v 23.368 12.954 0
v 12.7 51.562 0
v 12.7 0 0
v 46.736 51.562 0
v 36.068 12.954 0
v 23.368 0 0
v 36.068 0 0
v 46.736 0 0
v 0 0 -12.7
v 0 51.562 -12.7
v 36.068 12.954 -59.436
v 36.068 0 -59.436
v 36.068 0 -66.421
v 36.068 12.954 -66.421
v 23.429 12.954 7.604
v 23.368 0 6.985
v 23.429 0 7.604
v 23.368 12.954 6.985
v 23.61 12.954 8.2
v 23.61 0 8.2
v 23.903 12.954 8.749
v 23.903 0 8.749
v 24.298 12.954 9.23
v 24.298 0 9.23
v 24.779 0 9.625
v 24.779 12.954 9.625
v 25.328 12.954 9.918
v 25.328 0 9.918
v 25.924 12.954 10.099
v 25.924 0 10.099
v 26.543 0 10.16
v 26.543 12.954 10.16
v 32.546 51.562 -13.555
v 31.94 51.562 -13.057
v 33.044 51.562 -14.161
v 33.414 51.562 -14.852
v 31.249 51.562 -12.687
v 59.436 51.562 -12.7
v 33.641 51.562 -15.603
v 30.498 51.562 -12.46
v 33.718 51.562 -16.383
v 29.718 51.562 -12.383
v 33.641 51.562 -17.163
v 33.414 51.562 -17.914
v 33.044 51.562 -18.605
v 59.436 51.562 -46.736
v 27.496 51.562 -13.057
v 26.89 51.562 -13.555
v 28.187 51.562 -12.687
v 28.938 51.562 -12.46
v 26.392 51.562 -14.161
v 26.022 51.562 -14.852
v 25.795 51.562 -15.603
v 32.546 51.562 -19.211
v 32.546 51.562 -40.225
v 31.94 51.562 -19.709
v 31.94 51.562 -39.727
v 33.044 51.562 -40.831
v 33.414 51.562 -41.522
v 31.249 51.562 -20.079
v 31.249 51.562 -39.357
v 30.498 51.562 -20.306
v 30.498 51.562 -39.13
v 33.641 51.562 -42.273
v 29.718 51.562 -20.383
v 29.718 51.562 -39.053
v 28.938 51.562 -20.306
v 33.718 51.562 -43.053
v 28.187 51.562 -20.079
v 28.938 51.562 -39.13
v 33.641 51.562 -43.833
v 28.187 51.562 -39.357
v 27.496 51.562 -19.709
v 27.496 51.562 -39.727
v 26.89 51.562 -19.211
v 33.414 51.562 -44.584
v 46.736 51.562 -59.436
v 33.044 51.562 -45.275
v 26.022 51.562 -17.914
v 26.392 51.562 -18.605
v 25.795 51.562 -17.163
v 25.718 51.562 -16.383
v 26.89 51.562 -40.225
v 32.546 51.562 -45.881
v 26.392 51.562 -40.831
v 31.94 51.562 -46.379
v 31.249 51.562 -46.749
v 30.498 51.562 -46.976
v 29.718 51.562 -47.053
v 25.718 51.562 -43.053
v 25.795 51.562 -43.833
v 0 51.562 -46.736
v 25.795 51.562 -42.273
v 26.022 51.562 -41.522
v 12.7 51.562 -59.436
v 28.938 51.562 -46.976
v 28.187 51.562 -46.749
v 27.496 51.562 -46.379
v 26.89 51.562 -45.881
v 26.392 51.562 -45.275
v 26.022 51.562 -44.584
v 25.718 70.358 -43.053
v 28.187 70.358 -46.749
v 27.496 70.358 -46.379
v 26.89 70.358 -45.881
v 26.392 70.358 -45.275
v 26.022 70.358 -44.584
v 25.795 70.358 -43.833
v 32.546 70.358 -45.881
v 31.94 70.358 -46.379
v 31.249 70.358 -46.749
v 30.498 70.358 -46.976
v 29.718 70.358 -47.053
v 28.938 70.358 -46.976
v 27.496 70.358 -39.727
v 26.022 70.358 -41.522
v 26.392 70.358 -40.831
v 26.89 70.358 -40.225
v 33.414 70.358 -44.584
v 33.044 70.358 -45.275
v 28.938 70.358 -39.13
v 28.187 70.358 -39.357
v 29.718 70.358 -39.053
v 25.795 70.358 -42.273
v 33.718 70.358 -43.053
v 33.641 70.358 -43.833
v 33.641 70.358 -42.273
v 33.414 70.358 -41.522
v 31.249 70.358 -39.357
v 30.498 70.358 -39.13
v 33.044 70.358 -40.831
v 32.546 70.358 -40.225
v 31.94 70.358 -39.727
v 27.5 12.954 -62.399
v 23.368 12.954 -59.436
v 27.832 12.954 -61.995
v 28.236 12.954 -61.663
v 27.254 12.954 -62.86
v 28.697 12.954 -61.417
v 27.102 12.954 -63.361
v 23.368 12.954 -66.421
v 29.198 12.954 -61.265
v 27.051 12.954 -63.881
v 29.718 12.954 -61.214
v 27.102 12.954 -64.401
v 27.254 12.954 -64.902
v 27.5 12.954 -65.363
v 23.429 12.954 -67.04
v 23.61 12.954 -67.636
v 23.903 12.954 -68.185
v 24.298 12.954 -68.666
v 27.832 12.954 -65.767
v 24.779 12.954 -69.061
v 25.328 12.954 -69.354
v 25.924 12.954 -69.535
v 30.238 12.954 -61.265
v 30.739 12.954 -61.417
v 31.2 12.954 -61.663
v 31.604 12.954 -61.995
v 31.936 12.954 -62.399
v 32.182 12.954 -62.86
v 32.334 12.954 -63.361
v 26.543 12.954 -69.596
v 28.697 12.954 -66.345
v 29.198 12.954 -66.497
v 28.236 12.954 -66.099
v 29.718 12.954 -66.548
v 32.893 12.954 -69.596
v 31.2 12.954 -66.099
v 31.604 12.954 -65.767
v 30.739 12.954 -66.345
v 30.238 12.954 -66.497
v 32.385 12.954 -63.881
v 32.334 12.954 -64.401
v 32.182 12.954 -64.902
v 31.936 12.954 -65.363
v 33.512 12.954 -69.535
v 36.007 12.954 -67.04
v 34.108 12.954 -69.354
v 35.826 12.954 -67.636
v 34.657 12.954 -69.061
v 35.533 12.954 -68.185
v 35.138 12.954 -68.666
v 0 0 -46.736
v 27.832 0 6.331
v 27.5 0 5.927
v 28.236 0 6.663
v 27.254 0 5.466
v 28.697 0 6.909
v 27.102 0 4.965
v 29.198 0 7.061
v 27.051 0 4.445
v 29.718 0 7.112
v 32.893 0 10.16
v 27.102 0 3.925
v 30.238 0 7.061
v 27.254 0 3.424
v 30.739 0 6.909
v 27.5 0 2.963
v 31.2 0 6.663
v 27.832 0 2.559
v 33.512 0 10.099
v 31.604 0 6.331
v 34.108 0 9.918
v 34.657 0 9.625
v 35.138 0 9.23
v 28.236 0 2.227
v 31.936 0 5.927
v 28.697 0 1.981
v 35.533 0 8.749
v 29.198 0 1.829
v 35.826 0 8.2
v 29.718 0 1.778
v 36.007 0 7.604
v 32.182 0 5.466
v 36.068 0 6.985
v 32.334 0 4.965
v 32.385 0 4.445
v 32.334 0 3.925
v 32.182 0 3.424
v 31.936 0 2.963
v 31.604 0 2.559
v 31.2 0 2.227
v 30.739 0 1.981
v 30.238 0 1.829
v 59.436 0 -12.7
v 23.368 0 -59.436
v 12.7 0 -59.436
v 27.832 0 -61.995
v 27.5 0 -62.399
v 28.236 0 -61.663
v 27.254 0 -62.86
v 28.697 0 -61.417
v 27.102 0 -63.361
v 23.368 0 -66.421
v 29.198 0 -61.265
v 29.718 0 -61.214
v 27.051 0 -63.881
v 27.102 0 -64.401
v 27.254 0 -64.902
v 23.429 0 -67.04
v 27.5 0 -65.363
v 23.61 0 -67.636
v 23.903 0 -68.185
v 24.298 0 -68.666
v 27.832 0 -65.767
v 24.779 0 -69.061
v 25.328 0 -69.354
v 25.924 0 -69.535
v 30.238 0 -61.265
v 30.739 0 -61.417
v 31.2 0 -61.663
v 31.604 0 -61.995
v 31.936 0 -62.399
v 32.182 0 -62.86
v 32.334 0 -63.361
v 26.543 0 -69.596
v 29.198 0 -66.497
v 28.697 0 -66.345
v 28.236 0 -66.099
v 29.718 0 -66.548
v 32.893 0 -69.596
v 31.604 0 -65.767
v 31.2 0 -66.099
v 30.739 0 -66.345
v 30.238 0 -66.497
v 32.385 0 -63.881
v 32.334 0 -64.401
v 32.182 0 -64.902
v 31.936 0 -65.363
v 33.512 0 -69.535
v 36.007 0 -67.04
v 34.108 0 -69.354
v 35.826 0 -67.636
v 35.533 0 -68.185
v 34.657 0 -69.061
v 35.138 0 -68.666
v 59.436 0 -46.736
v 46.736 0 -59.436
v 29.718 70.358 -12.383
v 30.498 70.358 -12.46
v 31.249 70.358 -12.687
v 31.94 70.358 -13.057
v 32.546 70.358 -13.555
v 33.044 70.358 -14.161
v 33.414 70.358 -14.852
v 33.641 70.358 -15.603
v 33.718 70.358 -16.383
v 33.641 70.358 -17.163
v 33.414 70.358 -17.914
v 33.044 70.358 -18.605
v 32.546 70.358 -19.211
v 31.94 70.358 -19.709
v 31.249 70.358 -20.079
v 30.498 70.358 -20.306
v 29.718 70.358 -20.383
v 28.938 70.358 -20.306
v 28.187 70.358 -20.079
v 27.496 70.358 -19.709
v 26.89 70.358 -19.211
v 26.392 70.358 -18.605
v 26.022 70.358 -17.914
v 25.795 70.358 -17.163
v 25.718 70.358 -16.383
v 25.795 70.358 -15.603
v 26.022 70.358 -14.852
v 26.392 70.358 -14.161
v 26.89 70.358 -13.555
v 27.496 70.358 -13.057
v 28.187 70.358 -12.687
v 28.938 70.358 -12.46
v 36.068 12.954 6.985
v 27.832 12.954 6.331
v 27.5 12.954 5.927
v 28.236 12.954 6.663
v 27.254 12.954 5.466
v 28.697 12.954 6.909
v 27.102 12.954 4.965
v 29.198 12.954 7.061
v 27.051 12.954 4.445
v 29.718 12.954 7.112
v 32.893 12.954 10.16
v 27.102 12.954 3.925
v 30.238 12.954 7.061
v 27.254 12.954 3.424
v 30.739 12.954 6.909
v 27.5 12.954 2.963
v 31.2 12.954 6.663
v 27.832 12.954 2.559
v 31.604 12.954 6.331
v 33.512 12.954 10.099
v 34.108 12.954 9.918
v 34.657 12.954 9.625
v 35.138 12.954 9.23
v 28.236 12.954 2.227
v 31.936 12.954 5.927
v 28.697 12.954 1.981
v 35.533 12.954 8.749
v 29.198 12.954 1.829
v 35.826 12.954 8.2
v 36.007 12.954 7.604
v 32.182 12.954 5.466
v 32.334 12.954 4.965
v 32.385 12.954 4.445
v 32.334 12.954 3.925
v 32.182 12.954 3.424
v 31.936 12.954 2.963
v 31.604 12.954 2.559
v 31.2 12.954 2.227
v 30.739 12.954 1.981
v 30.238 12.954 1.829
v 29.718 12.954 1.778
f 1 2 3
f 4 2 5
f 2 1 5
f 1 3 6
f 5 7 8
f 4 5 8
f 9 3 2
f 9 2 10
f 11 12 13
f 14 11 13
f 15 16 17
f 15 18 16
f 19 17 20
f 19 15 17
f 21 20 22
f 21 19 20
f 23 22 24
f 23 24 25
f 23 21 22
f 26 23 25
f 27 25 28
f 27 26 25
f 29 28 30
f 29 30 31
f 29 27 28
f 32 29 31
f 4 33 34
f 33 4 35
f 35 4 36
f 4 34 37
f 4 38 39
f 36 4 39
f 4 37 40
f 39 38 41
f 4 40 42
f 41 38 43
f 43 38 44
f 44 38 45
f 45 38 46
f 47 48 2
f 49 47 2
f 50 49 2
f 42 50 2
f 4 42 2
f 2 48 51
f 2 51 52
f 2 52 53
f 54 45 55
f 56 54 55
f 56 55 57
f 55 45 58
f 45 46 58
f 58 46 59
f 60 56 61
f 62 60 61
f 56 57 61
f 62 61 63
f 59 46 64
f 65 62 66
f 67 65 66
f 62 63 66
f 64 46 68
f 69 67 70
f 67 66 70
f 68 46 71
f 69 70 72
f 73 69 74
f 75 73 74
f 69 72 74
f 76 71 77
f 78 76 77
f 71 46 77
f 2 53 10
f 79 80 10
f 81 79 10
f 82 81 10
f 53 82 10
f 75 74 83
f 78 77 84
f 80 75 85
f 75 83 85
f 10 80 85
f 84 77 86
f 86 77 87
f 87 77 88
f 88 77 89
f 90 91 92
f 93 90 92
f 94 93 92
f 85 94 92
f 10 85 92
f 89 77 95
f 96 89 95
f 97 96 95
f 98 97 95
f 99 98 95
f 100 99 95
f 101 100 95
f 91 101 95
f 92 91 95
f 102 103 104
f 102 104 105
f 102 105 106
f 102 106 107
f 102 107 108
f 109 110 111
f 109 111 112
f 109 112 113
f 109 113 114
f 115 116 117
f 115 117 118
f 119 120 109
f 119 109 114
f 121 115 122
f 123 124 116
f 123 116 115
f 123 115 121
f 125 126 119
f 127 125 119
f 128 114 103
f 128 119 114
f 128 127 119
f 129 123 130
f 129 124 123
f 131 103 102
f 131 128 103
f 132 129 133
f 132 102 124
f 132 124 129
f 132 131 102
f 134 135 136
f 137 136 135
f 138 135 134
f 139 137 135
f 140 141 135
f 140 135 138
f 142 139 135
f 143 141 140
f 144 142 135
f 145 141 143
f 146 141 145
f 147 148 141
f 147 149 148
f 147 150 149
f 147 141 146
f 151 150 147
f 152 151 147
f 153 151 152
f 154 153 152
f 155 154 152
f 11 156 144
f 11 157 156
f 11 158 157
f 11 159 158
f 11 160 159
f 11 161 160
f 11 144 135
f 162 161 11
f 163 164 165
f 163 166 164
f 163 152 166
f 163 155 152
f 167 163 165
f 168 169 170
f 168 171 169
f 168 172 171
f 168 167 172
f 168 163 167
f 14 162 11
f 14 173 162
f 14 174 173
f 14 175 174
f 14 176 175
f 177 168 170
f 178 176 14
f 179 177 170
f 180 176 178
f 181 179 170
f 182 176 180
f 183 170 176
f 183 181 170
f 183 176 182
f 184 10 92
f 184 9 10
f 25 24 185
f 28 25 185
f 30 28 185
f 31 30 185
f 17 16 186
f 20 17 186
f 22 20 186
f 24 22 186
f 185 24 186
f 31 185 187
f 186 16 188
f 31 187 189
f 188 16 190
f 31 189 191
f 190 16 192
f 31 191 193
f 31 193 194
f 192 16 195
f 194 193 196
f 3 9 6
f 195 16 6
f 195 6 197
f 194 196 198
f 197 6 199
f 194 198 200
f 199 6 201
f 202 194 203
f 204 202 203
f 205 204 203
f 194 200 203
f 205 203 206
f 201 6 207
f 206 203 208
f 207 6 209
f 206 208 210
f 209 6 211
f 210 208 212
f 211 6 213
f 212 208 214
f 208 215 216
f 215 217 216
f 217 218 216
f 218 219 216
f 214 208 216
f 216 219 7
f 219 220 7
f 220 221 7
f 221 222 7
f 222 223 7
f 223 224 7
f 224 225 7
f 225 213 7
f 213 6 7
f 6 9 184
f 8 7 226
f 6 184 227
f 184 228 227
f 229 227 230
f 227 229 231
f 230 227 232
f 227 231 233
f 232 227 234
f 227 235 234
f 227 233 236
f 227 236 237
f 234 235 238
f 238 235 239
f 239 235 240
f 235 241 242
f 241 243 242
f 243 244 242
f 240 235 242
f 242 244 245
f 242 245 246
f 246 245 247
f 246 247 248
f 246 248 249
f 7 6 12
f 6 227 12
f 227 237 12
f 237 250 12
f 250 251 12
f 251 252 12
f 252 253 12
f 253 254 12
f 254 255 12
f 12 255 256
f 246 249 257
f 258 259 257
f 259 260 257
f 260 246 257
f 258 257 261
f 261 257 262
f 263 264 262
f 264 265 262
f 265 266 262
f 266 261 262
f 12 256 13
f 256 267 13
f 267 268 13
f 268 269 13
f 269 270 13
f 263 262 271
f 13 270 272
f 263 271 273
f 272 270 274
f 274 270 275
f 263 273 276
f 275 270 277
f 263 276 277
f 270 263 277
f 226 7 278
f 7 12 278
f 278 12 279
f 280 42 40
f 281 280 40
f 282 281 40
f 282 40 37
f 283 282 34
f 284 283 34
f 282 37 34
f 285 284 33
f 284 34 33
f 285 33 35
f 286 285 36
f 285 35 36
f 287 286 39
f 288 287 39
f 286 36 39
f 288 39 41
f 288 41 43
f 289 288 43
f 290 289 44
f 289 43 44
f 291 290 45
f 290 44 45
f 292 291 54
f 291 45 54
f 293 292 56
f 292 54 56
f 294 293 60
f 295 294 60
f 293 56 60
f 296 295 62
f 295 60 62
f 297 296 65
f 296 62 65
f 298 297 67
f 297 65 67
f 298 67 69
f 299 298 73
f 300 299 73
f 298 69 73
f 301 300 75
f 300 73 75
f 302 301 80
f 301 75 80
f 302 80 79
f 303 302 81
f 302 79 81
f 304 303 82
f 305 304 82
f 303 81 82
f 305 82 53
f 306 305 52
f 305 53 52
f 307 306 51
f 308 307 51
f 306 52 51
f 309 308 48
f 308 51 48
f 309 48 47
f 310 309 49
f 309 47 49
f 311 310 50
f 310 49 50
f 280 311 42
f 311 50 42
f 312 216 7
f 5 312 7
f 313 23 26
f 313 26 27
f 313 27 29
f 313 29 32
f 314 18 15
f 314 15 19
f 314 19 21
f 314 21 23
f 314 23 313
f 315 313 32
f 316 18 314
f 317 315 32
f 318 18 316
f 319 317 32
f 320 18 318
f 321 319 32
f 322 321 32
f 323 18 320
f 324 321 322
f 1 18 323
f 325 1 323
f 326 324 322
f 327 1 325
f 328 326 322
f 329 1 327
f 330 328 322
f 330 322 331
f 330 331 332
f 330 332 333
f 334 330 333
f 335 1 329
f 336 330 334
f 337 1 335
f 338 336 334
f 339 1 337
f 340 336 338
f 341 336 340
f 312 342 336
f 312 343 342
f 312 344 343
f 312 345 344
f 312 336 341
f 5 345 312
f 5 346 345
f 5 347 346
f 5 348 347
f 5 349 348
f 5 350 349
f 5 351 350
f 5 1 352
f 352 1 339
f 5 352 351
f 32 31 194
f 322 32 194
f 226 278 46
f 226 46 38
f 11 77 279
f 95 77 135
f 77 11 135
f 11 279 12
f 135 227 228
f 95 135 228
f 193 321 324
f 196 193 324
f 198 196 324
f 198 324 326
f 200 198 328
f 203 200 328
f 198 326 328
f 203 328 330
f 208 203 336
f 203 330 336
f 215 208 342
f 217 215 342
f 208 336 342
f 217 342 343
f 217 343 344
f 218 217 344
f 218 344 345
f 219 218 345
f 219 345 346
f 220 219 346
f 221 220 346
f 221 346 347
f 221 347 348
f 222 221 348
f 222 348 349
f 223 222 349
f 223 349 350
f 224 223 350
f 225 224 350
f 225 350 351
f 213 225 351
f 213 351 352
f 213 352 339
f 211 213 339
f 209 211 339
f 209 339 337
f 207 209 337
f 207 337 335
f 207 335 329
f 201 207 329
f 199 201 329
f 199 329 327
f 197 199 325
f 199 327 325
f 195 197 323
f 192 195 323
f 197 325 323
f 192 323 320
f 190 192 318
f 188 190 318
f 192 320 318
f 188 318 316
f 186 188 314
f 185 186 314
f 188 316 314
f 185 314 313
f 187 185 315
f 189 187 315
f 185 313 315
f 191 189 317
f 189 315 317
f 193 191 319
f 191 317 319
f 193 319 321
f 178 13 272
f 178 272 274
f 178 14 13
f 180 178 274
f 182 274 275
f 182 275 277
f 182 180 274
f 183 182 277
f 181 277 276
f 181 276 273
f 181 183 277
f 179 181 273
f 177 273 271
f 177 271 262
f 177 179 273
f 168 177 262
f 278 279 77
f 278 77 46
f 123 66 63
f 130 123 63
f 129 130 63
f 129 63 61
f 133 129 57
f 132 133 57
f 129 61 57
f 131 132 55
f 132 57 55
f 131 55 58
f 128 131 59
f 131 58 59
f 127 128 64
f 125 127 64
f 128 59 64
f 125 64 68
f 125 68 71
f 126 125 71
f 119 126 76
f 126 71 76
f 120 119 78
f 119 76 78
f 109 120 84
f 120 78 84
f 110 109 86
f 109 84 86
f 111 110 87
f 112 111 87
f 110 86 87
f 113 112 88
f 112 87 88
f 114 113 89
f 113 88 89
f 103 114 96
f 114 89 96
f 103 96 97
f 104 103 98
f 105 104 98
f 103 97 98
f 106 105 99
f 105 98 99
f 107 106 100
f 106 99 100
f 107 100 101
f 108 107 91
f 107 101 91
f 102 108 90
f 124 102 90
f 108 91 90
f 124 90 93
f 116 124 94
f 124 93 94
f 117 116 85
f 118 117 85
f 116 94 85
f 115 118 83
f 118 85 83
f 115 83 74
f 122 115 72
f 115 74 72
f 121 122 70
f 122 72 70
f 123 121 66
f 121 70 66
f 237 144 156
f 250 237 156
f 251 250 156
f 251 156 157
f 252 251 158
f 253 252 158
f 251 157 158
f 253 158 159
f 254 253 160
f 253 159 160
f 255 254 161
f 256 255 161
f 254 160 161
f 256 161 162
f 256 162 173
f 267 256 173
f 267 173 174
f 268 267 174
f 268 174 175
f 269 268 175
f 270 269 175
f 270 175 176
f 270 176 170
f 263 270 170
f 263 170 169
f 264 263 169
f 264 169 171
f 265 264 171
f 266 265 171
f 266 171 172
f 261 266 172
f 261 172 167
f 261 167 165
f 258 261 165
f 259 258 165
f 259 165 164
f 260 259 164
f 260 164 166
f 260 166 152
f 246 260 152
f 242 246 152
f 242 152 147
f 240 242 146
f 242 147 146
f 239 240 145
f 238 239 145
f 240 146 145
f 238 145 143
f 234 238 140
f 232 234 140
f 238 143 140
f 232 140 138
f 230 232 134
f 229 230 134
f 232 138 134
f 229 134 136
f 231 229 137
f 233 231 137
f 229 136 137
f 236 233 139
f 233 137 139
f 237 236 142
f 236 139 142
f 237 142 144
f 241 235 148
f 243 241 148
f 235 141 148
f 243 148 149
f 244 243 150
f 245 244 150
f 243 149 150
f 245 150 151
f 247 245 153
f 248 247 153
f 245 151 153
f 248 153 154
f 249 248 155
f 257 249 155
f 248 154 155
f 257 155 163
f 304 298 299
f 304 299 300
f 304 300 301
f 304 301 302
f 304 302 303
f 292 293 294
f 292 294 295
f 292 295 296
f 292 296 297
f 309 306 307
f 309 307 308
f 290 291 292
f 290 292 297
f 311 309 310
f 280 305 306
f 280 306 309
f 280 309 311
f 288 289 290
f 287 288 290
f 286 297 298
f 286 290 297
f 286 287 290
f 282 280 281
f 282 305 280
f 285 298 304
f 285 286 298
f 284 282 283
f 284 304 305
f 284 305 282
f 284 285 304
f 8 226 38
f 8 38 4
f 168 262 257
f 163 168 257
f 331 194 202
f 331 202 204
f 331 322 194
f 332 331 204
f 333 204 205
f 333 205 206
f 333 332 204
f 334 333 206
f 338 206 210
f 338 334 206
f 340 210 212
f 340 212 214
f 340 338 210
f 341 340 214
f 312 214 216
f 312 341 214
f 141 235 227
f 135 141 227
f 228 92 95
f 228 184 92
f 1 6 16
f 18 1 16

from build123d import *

# Parameters (mm, degrees)
BOSS_EXTRUDE1_DEPTH = 12.954
BOSS_EXTRUDE2_DEPTH = 38.608
SKETCH3_R           = 2.667
CUT_EXTRUDE1_DEPTH  = 100.331862844
FILLET1_R           = 3.175
SKETCH4_R           = 4
BOSS_EXTRUDE3_DEPTH = 18.796


with BuildPart() as part:
    # Sketch1 → Boss-Extrude1 (new body)
    with BuildSketch(Plane(origin=(0, 0, 0), x_dir=(1, 0, 0), z_dir=(0, 1, 0))):
        Polygon((36.068, 0), (29.718, 0), (23.368, 0), (23.368, -10.16), (36.068, -10.16), align=None)
        Polygon((36.068, 59.436), (29.718, 59.436), (29.718, 0), (36.068, 0), (46.736, 0), (59.436, 12.7), (59.436, 46.736), (46.736, 59.436), align=None)
        Polygon((29.718, 0), (29.718, 59.436), (23.368, 59.436), (12.7, 59.436), (0, 46.736), (0, 12.7), (12.7, 0), (23.368, 0), align=None)
        Polygon((23.368, 59.436), (29.718, 59.436), (36.068, 59.436), (36.068, 69.596), (23.368, 69.596), align=None)
    extrude(amount=BOSS_EXTRUDE1_DEPTH)

    # Sketch2 → Boss-Extrude2 (add)
    with BuildSketch(Plane(origin=(0, 12.954, 0), x_dir=(1, 0, 0), z_dir=(0, 1, 0))):
        Polygon((23.368, 59.436), (36.068, 59.436), (46.736, 59.436), (59.436, 46.736), (59.436, 12.7), (46.736, 0), (36.068, 0), (23.368, 0), (12.7, 0), (0, 12.7), (0, 46.736), (12.7, 59.436), align=None)
    extrude(amount=BOSS_EXTRUDE2_DEPTH)

    # Sketch3 → Cut-Extrude1 (cut, through all)
    with BuildSketch(Plane(origin=(0, 12.954, 0), x_dir=(1, 0, 0), z_dir=(0, 1, 0))):
        with Locations(Location((29.718, 63.881, 0), (0, 0, 270))):
            Circle(SKETCH3_R)
        with Locations(Location((29.718, -4.445, 0), (0, 0, 270))):
            Circle(SKETCH3_R)
    extrude(amount=-CUT_EXTRUDE1_DEPTH, mode=Mode.SUBTRACT)

    # Fillet1
    fillet1_edges = [part.edges().sort_by_distance(p)[0] for p in [
        (36.068, 6.477, 10.16),
        (23.368, 6.477, 10.16),
        (23.368, 6.477, -69.596),
        (36.068, 6.477, -69.596),
    ]]
    fillet(fillet1_edges, radius=FILLET1_R)

    # Sketch4 → Boss-Extrude3 (add)
    with BuildSketch(Plane(origin=(0, 51.562, 0), x_dir=(1, 0, 0), z_dir=(0, 1, 0))):
        with Locations(Location((29.718, 43.053, 0), (0, 0, 270))):
            Circle(SKETCH4_R)
        with Locations(Location((29.718, 16.383, 0), (0, 0, 270))):
            Circle(SKETCH4_R)
    extrude(amount=BOSS_EXTRUDE3_DEPTH)


solid = part.part
